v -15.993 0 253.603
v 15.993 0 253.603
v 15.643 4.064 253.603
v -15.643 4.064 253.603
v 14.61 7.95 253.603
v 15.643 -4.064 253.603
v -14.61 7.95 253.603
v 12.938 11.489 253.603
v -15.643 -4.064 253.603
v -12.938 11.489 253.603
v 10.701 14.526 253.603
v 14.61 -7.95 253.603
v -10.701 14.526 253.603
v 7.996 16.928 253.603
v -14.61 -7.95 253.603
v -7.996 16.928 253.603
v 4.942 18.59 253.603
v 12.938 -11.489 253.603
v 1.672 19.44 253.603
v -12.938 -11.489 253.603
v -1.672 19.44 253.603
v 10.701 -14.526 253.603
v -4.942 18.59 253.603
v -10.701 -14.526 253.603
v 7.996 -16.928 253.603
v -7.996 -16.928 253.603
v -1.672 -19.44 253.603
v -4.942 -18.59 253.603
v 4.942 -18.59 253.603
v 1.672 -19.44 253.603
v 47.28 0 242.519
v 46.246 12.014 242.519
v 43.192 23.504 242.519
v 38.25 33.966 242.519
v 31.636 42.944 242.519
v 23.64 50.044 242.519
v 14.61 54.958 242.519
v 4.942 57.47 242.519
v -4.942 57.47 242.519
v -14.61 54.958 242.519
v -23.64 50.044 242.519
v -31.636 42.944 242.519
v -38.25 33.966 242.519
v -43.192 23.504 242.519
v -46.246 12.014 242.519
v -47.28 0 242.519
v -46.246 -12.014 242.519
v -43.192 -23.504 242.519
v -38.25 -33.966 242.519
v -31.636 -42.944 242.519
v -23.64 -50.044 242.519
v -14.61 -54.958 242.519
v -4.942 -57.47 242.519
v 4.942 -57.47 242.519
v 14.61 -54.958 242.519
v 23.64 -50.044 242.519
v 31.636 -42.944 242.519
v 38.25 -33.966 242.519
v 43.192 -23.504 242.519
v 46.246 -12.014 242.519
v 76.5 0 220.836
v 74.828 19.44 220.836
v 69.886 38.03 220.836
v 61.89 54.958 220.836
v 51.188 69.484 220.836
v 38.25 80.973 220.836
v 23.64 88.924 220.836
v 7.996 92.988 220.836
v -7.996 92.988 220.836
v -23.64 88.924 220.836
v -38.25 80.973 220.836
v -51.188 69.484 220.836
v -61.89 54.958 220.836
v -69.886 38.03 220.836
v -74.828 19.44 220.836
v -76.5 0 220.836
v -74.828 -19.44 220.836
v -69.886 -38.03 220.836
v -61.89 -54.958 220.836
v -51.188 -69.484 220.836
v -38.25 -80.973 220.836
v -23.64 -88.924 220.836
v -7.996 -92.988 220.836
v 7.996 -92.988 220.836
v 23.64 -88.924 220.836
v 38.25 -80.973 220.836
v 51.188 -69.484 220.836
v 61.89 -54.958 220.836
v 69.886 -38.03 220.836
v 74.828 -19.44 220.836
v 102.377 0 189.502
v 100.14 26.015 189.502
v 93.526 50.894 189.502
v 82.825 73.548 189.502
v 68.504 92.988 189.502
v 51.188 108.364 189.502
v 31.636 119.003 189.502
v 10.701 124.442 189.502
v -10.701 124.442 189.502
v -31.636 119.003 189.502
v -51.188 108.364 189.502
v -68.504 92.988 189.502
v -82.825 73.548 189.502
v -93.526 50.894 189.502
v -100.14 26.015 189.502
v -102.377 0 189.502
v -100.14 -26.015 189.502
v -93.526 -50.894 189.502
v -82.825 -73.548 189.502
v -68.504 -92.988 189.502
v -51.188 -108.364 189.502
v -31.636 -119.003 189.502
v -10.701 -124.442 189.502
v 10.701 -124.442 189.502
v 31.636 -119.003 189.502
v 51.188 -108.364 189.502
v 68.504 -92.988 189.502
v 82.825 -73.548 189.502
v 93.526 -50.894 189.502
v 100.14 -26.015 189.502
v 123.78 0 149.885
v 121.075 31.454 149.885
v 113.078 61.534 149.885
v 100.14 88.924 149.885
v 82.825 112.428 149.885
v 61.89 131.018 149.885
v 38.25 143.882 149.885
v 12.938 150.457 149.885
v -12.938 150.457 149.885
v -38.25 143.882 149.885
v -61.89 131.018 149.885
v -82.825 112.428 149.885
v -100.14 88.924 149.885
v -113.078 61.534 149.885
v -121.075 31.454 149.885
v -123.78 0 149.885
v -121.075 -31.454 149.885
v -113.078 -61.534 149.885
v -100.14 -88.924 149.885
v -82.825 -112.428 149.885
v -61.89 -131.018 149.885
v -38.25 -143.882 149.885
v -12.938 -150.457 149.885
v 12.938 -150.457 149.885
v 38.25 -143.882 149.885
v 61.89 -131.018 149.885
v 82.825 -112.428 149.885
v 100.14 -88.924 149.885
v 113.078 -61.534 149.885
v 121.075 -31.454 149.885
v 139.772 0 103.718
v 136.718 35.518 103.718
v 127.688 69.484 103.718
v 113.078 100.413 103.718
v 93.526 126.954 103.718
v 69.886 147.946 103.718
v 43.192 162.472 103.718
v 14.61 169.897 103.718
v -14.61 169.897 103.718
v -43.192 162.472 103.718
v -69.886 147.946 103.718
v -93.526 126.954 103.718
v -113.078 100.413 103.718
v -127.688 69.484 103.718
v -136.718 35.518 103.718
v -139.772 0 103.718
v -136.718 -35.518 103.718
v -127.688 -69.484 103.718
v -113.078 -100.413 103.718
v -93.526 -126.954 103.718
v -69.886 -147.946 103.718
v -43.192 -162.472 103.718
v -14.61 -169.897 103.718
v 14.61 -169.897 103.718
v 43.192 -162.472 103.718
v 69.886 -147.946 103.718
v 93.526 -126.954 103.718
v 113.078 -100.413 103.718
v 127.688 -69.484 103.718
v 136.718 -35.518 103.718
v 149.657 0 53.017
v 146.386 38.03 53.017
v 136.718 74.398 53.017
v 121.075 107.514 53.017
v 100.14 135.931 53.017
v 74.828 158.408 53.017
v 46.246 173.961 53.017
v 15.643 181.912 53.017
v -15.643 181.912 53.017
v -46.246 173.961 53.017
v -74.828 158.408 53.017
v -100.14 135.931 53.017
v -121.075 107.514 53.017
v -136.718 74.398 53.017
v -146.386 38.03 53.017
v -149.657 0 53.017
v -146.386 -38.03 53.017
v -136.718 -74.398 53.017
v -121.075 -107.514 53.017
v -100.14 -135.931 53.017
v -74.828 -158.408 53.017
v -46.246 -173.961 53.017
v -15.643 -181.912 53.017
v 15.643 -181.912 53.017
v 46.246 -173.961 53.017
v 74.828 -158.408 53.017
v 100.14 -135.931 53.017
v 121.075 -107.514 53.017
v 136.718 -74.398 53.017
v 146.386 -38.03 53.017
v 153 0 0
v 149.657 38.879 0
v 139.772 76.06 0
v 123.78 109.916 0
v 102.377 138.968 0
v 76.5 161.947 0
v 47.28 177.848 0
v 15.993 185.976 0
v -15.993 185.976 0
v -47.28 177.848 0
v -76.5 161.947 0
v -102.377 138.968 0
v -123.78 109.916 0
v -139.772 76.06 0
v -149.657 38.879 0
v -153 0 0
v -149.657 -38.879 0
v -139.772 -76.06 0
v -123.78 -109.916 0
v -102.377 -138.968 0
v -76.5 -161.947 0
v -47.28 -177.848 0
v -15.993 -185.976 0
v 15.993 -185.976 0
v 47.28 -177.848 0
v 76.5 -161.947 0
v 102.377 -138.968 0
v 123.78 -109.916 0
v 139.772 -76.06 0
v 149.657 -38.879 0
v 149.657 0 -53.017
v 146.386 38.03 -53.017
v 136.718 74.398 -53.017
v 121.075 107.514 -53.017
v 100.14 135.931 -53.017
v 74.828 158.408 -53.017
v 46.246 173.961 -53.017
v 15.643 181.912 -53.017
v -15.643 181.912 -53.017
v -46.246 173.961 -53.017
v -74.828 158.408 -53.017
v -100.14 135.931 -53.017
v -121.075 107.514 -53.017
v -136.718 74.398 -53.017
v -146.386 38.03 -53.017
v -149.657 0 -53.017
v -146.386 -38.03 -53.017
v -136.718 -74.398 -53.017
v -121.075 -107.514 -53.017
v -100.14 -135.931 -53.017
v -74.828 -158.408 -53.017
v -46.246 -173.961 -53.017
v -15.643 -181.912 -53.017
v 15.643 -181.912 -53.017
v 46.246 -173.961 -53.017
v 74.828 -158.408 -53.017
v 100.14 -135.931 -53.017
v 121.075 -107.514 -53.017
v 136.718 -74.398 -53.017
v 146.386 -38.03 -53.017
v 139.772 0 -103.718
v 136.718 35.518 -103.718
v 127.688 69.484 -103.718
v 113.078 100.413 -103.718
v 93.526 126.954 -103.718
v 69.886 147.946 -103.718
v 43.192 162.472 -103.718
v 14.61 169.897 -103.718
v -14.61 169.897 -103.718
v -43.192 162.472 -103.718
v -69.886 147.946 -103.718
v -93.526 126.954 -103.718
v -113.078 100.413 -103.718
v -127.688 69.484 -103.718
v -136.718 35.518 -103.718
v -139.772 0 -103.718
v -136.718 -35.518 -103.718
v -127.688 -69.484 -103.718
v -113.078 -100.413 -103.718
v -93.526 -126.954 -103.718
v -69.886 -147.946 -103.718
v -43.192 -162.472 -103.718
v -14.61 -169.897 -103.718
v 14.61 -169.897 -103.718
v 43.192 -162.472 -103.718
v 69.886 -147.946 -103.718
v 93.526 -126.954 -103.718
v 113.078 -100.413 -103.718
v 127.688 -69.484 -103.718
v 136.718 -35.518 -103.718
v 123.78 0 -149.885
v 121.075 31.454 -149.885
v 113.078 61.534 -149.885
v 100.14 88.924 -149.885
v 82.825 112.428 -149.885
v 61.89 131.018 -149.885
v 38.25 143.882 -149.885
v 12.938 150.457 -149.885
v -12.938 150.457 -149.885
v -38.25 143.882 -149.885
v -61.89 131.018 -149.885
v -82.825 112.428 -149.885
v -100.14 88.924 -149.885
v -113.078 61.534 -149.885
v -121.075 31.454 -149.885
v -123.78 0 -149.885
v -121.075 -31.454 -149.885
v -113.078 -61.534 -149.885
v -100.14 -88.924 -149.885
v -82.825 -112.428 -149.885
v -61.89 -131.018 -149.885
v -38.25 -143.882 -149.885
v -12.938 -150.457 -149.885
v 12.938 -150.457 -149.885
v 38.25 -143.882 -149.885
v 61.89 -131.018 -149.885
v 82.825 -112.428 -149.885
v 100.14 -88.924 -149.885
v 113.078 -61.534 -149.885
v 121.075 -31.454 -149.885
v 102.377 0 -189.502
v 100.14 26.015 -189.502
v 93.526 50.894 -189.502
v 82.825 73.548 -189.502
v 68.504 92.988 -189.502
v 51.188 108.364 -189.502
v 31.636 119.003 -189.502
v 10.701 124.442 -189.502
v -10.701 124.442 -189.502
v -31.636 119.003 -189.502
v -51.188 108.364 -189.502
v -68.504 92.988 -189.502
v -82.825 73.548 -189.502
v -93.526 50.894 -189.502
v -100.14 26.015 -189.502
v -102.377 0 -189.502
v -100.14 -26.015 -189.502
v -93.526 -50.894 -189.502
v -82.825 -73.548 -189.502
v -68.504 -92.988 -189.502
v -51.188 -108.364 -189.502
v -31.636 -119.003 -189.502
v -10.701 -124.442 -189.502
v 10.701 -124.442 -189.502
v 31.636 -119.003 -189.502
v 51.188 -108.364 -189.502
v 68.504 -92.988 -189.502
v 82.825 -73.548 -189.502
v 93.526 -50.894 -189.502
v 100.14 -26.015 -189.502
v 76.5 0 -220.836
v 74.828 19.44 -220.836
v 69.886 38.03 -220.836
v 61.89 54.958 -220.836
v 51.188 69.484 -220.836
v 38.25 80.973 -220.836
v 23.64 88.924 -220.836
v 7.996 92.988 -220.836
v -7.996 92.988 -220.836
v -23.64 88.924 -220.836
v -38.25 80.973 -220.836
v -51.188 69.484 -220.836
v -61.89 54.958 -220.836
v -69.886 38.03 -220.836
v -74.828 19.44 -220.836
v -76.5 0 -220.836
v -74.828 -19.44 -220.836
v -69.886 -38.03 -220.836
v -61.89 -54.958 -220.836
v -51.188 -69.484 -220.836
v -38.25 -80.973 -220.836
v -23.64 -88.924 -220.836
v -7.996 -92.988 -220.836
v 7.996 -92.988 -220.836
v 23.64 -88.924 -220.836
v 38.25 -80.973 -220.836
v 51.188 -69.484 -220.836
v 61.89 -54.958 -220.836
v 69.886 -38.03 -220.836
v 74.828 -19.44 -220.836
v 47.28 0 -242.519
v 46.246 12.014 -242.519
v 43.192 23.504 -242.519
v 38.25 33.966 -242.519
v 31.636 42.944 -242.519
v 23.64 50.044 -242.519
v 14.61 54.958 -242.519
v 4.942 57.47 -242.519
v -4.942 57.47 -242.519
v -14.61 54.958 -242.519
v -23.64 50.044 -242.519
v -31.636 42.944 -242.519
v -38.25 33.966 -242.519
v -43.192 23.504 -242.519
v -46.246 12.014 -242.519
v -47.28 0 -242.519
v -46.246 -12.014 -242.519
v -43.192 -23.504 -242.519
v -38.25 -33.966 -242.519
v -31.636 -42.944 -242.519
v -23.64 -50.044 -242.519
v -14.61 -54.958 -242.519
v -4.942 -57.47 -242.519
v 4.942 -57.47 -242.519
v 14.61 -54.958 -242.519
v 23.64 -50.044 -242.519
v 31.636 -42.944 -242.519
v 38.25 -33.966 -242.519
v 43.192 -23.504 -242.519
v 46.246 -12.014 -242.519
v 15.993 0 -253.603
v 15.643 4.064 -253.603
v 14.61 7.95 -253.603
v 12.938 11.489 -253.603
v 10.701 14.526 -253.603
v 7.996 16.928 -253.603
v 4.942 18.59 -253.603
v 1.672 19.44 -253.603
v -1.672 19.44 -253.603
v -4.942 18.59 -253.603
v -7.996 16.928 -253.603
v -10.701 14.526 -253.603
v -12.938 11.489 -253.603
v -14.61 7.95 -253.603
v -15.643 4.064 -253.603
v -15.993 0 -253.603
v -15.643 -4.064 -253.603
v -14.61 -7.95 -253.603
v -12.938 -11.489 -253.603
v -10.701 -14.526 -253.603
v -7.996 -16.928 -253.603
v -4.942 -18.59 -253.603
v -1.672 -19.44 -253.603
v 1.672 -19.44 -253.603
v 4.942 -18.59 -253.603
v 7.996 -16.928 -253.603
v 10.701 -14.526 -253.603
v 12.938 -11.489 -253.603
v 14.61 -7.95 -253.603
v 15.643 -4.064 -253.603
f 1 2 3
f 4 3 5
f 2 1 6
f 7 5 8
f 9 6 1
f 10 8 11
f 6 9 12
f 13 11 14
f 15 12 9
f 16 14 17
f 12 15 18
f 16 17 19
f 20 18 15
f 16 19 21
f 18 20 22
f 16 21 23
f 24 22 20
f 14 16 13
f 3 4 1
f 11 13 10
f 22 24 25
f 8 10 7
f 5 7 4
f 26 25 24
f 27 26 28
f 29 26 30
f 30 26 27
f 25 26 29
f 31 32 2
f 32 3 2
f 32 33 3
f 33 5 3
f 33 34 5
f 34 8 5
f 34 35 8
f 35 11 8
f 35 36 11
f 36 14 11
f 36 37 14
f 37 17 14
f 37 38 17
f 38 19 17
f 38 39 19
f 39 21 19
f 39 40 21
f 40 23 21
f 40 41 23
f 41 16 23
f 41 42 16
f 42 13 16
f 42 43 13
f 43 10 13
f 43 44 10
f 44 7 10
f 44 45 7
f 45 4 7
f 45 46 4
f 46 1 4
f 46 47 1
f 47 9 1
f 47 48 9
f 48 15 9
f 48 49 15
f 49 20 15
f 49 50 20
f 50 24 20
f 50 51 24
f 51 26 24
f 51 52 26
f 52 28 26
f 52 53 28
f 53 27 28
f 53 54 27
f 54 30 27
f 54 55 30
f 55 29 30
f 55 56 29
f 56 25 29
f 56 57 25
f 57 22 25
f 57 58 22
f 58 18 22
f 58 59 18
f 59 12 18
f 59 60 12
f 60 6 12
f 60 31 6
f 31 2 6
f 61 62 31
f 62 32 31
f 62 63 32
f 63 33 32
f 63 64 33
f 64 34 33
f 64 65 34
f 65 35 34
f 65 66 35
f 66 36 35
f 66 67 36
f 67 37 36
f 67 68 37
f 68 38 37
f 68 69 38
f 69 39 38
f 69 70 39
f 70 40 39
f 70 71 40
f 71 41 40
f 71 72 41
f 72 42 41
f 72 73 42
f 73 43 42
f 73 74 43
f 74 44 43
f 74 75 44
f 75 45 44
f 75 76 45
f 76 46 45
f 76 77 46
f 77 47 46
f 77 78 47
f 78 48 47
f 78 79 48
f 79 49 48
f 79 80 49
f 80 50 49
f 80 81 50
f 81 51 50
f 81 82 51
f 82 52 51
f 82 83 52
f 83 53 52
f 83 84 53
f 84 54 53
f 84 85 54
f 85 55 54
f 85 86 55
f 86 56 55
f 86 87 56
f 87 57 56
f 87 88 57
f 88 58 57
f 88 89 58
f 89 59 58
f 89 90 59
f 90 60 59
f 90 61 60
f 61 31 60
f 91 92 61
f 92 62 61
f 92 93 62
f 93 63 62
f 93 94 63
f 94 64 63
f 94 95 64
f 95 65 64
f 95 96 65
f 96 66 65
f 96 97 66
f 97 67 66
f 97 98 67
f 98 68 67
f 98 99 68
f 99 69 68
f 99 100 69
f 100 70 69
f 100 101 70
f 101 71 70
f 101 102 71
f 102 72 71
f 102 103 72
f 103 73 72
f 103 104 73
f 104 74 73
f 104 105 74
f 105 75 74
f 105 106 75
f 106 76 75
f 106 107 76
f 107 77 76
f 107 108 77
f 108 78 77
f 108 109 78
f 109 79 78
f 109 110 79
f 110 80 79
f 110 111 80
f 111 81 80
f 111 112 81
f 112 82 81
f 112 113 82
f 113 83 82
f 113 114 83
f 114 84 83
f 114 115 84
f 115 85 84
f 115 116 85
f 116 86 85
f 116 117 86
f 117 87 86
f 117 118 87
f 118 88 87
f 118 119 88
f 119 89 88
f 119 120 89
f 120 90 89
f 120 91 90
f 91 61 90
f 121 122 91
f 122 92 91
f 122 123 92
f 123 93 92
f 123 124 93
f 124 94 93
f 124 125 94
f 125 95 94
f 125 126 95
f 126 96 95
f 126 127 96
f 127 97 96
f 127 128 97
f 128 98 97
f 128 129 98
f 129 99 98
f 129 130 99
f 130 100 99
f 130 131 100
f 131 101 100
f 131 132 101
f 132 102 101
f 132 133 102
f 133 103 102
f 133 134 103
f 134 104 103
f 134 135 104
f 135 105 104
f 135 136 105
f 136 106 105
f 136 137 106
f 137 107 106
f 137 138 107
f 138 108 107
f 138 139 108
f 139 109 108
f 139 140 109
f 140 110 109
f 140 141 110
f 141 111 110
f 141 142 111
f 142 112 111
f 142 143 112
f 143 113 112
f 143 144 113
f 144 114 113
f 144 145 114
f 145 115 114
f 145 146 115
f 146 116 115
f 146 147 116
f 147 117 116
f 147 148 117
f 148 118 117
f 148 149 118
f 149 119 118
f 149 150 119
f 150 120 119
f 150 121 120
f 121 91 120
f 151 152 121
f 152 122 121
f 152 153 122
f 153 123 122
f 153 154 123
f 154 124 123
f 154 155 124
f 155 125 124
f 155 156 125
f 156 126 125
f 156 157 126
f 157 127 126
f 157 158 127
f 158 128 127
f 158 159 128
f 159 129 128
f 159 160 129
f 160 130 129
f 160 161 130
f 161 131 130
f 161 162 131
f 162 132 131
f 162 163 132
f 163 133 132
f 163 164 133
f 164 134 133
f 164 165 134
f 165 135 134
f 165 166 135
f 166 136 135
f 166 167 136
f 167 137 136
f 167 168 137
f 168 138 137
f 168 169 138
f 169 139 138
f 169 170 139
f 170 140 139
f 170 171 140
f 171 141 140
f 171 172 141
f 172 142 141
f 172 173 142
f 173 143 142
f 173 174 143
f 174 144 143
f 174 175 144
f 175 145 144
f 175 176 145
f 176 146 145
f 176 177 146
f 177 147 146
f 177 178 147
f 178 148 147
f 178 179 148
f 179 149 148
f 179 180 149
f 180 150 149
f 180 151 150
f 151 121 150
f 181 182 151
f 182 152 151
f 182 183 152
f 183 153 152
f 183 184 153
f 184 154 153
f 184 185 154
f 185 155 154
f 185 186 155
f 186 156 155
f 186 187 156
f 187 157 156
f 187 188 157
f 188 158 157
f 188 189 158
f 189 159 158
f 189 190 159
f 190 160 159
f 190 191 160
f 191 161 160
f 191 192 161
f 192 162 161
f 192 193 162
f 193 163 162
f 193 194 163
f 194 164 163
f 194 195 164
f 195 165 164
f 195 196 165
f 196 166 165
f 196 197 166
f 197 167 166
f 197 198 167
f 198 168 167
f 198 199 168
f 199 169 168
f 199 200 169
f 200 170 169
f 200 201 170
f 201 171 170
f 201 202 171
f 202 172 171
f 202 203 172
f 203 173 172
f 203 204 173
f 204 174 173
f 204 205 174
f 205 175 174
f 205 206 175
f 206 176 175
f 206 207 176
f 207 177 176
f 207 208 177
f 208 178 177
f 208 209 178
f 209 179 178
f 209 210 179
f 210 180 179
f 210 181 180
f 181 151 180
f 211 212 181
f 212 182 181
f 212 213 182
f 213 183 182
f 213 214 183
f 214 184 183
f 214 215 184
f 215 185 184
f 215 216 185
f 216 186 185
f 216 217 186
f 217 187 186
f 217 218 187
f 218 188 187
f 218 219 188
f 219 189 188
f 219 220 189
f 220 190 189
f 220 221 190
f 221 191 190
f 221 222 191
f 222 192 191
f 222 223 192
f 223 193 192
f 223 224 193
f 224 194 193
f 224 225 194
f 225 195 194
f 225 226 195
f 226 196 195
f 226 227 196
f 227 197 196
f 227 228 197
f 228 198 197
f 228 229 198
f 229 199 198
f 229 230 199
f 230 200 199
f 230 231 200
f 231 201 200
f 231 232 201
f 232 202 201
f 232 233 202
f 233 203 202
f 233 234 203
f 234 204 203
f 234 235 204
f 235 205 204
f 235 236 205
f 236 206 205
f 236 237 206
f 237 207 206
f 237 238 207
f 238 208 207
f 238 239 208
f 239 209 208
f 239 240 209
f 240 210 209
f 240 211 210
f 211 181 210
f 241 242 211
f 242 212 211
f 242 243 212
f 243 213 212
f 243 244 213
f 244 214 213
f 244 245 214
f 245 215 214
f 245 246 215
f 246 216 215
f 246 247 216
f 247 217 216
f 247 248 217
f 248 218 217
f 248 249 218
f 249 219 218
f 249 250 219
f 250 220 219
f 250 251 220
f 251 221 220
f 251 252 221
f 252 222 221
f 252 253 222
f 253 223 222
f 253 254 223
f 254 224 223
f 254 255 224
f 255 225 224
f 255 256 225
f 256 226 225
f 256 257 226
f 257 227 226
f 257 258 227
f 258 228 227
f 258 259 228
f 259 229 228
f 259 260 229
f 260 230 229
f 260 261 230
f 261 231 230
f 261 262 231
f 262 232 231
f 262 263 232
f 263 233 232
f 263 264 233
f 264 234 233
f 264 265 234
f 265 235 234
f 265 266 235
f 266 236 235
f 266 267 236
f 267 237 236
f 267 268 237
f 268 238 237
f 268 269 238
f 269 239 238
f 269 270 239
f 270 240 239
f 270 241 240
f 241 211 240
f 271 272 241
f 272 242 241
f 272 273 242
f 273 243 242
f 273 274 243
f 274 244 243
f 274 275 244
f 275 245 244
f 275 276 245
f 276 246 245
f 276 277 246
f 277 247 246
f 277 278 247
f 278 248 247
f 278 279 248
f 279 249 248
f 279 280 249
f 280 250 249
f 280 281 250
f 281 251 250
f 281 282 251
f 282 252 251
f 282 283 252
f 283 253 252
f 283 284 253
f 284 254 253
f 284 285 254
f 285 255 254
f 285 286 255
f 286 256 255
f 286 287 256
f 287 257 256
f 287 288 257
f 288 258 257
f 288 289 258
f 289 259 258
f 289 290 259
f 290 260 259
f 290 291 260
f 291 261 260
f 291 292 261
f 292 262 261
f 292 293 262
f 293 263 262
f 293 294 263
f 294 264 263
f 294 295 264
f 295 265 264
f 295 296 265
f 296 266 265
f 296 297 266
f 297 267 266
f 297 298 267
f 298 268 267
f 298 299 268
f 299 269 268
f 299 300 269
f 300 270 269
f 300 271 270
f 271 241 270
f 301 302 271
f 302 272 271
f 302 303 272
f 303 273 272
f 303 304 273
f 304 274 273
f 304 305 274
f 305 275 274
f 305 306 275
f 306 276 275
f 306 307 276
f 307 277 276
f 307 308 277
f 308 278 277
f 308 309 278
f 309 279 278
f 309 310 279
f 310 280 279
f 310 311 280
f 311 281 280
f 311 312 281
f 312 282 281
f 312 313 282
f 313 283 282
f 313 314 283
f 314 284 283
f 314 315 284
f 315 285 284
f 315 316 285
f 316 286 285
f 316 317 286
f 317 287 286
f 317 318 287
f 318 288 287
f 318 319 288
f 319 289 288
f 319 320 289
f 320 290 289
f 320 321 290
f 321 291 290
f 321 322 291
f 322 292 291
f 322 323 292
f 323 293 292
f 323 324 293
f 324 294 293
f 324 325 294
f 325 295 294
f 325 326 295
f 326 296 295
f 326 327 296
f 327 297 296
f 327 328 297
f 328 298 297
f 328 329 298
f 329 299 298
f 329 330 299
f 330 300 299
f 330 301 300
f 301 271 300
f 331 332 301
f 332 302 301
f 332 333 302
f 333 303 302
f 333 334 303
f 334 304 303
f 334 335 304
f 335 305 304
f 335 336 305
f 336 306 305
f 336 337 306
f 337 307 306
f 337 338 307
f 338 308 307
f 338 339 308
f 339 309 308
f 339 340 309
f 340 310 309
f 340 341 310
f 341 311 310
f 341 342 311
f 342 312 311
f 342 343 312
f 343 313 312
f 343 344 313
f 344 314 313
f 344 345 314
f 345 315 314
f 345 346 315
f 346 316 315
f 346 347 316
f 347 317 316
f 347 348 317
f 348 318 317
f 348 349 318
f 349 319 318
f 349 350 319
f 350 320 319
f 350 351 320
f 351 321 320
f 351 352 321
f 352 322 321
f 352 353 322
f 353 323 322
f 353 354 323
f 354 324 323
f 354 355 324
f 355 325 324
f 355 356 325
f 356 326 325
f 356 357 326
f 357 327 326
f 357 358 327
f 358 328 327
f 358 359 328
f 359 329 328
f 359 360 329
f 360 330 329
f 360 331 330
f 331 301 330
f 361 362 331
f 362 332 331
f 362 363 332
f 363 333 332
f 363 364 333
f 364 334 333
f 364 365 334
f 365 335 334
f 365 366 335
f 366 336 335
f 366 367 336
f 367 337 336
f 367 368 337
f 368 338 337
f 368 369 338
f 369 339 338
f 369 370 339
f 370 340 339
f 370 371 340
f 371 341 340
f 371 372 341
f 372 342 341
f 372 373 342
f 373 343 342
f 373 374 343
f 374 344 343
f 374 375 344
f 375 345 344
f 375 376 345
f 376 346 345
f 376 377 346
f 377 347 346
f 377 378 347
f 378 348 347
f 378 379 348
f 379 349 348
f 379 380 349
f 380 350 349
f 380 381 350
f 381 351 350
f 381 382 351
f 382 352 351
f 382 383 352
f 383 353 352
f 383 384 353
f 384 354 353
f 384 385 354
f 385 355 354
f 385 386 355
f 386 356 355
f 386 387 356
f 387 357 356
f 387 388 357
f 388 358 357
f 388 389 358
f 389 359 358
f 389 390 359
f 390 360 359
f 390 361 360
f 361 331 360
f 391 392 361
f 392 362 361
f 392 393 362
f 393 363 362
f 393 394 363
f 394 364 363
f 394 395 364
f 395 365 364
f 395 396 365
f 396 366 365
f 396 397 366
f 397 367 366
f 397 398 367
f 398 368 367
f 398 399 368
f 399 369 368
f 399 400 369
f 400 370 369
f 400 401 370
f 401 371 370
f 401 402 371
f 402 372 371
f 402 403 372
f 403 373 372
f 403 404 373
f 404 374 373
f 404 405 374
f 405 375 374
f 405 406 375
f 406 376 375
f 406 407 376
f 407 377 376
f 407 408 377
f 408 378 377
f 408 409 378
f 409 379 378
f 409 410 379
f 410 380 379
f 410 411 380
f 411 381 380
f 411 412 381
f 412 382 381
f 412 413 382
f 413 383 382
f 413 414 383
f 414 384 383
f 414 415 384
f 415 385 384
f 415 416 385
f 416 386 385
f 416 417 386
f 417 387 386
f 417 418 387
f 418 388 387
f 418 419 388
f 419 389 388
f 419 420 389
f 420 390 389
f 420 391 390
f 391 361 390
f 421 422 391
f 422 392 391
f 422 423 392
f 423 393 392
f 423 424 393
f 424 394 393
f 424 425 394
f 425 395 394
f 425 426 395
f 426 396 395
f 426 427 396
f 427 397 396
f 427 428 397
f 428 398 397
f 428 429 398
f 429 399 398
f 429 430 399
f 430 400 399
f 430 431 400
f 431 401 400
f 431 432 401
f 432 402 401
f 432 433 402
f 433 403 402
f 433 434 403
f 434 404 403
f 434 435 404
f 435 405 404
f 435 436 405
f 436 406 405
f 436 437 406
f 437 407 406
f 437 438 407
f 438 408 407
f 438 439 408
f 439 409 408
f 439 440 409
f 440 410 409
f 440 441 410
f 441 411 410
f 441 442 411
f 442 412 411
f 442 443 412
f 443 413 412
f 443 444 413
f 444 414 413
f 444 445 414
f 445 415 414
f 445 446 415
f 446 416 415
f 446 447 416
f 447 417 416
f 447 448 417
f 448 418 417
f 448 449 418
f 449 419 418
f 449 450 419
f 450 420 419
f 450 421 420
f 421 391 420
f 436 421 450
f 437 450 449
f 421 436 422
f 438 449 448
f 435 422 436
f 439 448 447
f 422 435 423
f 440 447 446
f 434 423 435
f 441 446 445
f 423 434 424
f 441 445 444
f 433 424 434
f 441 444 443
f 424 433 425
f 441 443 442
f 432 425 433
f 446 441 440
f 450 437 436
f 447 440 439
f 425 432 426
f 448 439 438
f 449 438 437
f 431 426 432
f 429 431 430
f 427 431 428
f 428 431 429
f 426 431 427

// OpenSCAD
// Generated by SolidPython 1.0.1 on 2020-07-29 00:46:48


scale(v = [9, 11, 15]) {
	sphere(r = 17);
}
/***********************************************
*********      SolidPython code:      **********
************************************************
 
# import packages: SolidPython
from solid import *
from solid.utils import *
from itertools import chain, combinations, permutations


class Resize:

    def __init__(self, scad_file):
        self.scad_file = scad_file
        #self.scad_file = import_scad(scad_file)
        # cone/cylinder param:
        self.r1 = 0
        self.r2 = 0
        self.h = 0
        # rectangular prism param:
        self.w = 0
        self.l = 0
        # ellipse param:
        self.r = 0

    # import OpenScad code (file name corresponds to shape)


    # classify shape + parameters
    def assign(self, param1, param2, param3):
        if self.scad_file == 'cone.scad':
            self.r1 = param1
            self.r2 = param2
            self.h = param3
        elif self.scad_file == 'cylinder.scad':
            self.r1 = param1
            self.r2 = param2
            self.h = param3
        elif self.scad_file == 'rectangularPrism.scad':
            self.h = param1
            self.l = param2
            self.w = param3
        else:
            self.r = param1
            self.h = param2

    # resize parameters
    def iterate(self):
        x = range(3, 20, 2)
        i = 1
        if self.scad_file == 'cone.scad':
            tempList = list(permutations(x, 2))
            for temp in tempList:
                param1 = temp[0]
                param2 = temp[1]
                filepath = 'produced_scad_files/' + 'cone' + str(param1) + '_' + str(param2) + '_' + '.scad'
                scad_render_to_file(cylinder(h=param1, r1=param2, r2=0), filepath)

        elif self.scad_file == 'cylinder.scad':
            tempList = list(permutations(x, 3))
            for temp in tempList:
                param1 = temp[0]
                param2 = temp[1]
                filepath = 'produced_scad_files/' + 'cylinder' + str(param1) + '_' + str(param2) + '_' + '.scad'
                scad_render_to_file(cylinder(h=param1, r1=param2, r2=param2), filepath)

        elif self.scad_file == 'rectangularPrism.scad':
            tempList = list(permutations(x, 3))
            for temp in tempList:
                param1 = temp[0]
                param2 = temp[1]
                param3 = temp[2]
                filepath = 'produced_scad_files/' + 'rectangularPrism' + str(param1) + '_' + str(param2) + '_' + str(
                    param3) + '.scad'
                scad_render_to_file(cube(size=(param1, param2, param3)), filepath)

        elif self.scad_file == 'ellipse.scad':
            tempList = list(permutations(x, 4))
            for temp in tempList:
                param1 = temp[0]
                param2 = temp[1]
                param3 = temp[2]
                param4 = temp[3]
                filepath = 'produced_scad_files/' + 'ellipse' + str(param1) + '_' + str(param2) + '_' + str(param3) + '_' + str(param4) + '.scad'
                scad_render_to_file(scale([param1, param2, param3])(sphere(r=param4)), filepath)

    def render_to_scadfile(self):
        scad_render_to_file(scad, 'example.scad') 
 
************************************************/
